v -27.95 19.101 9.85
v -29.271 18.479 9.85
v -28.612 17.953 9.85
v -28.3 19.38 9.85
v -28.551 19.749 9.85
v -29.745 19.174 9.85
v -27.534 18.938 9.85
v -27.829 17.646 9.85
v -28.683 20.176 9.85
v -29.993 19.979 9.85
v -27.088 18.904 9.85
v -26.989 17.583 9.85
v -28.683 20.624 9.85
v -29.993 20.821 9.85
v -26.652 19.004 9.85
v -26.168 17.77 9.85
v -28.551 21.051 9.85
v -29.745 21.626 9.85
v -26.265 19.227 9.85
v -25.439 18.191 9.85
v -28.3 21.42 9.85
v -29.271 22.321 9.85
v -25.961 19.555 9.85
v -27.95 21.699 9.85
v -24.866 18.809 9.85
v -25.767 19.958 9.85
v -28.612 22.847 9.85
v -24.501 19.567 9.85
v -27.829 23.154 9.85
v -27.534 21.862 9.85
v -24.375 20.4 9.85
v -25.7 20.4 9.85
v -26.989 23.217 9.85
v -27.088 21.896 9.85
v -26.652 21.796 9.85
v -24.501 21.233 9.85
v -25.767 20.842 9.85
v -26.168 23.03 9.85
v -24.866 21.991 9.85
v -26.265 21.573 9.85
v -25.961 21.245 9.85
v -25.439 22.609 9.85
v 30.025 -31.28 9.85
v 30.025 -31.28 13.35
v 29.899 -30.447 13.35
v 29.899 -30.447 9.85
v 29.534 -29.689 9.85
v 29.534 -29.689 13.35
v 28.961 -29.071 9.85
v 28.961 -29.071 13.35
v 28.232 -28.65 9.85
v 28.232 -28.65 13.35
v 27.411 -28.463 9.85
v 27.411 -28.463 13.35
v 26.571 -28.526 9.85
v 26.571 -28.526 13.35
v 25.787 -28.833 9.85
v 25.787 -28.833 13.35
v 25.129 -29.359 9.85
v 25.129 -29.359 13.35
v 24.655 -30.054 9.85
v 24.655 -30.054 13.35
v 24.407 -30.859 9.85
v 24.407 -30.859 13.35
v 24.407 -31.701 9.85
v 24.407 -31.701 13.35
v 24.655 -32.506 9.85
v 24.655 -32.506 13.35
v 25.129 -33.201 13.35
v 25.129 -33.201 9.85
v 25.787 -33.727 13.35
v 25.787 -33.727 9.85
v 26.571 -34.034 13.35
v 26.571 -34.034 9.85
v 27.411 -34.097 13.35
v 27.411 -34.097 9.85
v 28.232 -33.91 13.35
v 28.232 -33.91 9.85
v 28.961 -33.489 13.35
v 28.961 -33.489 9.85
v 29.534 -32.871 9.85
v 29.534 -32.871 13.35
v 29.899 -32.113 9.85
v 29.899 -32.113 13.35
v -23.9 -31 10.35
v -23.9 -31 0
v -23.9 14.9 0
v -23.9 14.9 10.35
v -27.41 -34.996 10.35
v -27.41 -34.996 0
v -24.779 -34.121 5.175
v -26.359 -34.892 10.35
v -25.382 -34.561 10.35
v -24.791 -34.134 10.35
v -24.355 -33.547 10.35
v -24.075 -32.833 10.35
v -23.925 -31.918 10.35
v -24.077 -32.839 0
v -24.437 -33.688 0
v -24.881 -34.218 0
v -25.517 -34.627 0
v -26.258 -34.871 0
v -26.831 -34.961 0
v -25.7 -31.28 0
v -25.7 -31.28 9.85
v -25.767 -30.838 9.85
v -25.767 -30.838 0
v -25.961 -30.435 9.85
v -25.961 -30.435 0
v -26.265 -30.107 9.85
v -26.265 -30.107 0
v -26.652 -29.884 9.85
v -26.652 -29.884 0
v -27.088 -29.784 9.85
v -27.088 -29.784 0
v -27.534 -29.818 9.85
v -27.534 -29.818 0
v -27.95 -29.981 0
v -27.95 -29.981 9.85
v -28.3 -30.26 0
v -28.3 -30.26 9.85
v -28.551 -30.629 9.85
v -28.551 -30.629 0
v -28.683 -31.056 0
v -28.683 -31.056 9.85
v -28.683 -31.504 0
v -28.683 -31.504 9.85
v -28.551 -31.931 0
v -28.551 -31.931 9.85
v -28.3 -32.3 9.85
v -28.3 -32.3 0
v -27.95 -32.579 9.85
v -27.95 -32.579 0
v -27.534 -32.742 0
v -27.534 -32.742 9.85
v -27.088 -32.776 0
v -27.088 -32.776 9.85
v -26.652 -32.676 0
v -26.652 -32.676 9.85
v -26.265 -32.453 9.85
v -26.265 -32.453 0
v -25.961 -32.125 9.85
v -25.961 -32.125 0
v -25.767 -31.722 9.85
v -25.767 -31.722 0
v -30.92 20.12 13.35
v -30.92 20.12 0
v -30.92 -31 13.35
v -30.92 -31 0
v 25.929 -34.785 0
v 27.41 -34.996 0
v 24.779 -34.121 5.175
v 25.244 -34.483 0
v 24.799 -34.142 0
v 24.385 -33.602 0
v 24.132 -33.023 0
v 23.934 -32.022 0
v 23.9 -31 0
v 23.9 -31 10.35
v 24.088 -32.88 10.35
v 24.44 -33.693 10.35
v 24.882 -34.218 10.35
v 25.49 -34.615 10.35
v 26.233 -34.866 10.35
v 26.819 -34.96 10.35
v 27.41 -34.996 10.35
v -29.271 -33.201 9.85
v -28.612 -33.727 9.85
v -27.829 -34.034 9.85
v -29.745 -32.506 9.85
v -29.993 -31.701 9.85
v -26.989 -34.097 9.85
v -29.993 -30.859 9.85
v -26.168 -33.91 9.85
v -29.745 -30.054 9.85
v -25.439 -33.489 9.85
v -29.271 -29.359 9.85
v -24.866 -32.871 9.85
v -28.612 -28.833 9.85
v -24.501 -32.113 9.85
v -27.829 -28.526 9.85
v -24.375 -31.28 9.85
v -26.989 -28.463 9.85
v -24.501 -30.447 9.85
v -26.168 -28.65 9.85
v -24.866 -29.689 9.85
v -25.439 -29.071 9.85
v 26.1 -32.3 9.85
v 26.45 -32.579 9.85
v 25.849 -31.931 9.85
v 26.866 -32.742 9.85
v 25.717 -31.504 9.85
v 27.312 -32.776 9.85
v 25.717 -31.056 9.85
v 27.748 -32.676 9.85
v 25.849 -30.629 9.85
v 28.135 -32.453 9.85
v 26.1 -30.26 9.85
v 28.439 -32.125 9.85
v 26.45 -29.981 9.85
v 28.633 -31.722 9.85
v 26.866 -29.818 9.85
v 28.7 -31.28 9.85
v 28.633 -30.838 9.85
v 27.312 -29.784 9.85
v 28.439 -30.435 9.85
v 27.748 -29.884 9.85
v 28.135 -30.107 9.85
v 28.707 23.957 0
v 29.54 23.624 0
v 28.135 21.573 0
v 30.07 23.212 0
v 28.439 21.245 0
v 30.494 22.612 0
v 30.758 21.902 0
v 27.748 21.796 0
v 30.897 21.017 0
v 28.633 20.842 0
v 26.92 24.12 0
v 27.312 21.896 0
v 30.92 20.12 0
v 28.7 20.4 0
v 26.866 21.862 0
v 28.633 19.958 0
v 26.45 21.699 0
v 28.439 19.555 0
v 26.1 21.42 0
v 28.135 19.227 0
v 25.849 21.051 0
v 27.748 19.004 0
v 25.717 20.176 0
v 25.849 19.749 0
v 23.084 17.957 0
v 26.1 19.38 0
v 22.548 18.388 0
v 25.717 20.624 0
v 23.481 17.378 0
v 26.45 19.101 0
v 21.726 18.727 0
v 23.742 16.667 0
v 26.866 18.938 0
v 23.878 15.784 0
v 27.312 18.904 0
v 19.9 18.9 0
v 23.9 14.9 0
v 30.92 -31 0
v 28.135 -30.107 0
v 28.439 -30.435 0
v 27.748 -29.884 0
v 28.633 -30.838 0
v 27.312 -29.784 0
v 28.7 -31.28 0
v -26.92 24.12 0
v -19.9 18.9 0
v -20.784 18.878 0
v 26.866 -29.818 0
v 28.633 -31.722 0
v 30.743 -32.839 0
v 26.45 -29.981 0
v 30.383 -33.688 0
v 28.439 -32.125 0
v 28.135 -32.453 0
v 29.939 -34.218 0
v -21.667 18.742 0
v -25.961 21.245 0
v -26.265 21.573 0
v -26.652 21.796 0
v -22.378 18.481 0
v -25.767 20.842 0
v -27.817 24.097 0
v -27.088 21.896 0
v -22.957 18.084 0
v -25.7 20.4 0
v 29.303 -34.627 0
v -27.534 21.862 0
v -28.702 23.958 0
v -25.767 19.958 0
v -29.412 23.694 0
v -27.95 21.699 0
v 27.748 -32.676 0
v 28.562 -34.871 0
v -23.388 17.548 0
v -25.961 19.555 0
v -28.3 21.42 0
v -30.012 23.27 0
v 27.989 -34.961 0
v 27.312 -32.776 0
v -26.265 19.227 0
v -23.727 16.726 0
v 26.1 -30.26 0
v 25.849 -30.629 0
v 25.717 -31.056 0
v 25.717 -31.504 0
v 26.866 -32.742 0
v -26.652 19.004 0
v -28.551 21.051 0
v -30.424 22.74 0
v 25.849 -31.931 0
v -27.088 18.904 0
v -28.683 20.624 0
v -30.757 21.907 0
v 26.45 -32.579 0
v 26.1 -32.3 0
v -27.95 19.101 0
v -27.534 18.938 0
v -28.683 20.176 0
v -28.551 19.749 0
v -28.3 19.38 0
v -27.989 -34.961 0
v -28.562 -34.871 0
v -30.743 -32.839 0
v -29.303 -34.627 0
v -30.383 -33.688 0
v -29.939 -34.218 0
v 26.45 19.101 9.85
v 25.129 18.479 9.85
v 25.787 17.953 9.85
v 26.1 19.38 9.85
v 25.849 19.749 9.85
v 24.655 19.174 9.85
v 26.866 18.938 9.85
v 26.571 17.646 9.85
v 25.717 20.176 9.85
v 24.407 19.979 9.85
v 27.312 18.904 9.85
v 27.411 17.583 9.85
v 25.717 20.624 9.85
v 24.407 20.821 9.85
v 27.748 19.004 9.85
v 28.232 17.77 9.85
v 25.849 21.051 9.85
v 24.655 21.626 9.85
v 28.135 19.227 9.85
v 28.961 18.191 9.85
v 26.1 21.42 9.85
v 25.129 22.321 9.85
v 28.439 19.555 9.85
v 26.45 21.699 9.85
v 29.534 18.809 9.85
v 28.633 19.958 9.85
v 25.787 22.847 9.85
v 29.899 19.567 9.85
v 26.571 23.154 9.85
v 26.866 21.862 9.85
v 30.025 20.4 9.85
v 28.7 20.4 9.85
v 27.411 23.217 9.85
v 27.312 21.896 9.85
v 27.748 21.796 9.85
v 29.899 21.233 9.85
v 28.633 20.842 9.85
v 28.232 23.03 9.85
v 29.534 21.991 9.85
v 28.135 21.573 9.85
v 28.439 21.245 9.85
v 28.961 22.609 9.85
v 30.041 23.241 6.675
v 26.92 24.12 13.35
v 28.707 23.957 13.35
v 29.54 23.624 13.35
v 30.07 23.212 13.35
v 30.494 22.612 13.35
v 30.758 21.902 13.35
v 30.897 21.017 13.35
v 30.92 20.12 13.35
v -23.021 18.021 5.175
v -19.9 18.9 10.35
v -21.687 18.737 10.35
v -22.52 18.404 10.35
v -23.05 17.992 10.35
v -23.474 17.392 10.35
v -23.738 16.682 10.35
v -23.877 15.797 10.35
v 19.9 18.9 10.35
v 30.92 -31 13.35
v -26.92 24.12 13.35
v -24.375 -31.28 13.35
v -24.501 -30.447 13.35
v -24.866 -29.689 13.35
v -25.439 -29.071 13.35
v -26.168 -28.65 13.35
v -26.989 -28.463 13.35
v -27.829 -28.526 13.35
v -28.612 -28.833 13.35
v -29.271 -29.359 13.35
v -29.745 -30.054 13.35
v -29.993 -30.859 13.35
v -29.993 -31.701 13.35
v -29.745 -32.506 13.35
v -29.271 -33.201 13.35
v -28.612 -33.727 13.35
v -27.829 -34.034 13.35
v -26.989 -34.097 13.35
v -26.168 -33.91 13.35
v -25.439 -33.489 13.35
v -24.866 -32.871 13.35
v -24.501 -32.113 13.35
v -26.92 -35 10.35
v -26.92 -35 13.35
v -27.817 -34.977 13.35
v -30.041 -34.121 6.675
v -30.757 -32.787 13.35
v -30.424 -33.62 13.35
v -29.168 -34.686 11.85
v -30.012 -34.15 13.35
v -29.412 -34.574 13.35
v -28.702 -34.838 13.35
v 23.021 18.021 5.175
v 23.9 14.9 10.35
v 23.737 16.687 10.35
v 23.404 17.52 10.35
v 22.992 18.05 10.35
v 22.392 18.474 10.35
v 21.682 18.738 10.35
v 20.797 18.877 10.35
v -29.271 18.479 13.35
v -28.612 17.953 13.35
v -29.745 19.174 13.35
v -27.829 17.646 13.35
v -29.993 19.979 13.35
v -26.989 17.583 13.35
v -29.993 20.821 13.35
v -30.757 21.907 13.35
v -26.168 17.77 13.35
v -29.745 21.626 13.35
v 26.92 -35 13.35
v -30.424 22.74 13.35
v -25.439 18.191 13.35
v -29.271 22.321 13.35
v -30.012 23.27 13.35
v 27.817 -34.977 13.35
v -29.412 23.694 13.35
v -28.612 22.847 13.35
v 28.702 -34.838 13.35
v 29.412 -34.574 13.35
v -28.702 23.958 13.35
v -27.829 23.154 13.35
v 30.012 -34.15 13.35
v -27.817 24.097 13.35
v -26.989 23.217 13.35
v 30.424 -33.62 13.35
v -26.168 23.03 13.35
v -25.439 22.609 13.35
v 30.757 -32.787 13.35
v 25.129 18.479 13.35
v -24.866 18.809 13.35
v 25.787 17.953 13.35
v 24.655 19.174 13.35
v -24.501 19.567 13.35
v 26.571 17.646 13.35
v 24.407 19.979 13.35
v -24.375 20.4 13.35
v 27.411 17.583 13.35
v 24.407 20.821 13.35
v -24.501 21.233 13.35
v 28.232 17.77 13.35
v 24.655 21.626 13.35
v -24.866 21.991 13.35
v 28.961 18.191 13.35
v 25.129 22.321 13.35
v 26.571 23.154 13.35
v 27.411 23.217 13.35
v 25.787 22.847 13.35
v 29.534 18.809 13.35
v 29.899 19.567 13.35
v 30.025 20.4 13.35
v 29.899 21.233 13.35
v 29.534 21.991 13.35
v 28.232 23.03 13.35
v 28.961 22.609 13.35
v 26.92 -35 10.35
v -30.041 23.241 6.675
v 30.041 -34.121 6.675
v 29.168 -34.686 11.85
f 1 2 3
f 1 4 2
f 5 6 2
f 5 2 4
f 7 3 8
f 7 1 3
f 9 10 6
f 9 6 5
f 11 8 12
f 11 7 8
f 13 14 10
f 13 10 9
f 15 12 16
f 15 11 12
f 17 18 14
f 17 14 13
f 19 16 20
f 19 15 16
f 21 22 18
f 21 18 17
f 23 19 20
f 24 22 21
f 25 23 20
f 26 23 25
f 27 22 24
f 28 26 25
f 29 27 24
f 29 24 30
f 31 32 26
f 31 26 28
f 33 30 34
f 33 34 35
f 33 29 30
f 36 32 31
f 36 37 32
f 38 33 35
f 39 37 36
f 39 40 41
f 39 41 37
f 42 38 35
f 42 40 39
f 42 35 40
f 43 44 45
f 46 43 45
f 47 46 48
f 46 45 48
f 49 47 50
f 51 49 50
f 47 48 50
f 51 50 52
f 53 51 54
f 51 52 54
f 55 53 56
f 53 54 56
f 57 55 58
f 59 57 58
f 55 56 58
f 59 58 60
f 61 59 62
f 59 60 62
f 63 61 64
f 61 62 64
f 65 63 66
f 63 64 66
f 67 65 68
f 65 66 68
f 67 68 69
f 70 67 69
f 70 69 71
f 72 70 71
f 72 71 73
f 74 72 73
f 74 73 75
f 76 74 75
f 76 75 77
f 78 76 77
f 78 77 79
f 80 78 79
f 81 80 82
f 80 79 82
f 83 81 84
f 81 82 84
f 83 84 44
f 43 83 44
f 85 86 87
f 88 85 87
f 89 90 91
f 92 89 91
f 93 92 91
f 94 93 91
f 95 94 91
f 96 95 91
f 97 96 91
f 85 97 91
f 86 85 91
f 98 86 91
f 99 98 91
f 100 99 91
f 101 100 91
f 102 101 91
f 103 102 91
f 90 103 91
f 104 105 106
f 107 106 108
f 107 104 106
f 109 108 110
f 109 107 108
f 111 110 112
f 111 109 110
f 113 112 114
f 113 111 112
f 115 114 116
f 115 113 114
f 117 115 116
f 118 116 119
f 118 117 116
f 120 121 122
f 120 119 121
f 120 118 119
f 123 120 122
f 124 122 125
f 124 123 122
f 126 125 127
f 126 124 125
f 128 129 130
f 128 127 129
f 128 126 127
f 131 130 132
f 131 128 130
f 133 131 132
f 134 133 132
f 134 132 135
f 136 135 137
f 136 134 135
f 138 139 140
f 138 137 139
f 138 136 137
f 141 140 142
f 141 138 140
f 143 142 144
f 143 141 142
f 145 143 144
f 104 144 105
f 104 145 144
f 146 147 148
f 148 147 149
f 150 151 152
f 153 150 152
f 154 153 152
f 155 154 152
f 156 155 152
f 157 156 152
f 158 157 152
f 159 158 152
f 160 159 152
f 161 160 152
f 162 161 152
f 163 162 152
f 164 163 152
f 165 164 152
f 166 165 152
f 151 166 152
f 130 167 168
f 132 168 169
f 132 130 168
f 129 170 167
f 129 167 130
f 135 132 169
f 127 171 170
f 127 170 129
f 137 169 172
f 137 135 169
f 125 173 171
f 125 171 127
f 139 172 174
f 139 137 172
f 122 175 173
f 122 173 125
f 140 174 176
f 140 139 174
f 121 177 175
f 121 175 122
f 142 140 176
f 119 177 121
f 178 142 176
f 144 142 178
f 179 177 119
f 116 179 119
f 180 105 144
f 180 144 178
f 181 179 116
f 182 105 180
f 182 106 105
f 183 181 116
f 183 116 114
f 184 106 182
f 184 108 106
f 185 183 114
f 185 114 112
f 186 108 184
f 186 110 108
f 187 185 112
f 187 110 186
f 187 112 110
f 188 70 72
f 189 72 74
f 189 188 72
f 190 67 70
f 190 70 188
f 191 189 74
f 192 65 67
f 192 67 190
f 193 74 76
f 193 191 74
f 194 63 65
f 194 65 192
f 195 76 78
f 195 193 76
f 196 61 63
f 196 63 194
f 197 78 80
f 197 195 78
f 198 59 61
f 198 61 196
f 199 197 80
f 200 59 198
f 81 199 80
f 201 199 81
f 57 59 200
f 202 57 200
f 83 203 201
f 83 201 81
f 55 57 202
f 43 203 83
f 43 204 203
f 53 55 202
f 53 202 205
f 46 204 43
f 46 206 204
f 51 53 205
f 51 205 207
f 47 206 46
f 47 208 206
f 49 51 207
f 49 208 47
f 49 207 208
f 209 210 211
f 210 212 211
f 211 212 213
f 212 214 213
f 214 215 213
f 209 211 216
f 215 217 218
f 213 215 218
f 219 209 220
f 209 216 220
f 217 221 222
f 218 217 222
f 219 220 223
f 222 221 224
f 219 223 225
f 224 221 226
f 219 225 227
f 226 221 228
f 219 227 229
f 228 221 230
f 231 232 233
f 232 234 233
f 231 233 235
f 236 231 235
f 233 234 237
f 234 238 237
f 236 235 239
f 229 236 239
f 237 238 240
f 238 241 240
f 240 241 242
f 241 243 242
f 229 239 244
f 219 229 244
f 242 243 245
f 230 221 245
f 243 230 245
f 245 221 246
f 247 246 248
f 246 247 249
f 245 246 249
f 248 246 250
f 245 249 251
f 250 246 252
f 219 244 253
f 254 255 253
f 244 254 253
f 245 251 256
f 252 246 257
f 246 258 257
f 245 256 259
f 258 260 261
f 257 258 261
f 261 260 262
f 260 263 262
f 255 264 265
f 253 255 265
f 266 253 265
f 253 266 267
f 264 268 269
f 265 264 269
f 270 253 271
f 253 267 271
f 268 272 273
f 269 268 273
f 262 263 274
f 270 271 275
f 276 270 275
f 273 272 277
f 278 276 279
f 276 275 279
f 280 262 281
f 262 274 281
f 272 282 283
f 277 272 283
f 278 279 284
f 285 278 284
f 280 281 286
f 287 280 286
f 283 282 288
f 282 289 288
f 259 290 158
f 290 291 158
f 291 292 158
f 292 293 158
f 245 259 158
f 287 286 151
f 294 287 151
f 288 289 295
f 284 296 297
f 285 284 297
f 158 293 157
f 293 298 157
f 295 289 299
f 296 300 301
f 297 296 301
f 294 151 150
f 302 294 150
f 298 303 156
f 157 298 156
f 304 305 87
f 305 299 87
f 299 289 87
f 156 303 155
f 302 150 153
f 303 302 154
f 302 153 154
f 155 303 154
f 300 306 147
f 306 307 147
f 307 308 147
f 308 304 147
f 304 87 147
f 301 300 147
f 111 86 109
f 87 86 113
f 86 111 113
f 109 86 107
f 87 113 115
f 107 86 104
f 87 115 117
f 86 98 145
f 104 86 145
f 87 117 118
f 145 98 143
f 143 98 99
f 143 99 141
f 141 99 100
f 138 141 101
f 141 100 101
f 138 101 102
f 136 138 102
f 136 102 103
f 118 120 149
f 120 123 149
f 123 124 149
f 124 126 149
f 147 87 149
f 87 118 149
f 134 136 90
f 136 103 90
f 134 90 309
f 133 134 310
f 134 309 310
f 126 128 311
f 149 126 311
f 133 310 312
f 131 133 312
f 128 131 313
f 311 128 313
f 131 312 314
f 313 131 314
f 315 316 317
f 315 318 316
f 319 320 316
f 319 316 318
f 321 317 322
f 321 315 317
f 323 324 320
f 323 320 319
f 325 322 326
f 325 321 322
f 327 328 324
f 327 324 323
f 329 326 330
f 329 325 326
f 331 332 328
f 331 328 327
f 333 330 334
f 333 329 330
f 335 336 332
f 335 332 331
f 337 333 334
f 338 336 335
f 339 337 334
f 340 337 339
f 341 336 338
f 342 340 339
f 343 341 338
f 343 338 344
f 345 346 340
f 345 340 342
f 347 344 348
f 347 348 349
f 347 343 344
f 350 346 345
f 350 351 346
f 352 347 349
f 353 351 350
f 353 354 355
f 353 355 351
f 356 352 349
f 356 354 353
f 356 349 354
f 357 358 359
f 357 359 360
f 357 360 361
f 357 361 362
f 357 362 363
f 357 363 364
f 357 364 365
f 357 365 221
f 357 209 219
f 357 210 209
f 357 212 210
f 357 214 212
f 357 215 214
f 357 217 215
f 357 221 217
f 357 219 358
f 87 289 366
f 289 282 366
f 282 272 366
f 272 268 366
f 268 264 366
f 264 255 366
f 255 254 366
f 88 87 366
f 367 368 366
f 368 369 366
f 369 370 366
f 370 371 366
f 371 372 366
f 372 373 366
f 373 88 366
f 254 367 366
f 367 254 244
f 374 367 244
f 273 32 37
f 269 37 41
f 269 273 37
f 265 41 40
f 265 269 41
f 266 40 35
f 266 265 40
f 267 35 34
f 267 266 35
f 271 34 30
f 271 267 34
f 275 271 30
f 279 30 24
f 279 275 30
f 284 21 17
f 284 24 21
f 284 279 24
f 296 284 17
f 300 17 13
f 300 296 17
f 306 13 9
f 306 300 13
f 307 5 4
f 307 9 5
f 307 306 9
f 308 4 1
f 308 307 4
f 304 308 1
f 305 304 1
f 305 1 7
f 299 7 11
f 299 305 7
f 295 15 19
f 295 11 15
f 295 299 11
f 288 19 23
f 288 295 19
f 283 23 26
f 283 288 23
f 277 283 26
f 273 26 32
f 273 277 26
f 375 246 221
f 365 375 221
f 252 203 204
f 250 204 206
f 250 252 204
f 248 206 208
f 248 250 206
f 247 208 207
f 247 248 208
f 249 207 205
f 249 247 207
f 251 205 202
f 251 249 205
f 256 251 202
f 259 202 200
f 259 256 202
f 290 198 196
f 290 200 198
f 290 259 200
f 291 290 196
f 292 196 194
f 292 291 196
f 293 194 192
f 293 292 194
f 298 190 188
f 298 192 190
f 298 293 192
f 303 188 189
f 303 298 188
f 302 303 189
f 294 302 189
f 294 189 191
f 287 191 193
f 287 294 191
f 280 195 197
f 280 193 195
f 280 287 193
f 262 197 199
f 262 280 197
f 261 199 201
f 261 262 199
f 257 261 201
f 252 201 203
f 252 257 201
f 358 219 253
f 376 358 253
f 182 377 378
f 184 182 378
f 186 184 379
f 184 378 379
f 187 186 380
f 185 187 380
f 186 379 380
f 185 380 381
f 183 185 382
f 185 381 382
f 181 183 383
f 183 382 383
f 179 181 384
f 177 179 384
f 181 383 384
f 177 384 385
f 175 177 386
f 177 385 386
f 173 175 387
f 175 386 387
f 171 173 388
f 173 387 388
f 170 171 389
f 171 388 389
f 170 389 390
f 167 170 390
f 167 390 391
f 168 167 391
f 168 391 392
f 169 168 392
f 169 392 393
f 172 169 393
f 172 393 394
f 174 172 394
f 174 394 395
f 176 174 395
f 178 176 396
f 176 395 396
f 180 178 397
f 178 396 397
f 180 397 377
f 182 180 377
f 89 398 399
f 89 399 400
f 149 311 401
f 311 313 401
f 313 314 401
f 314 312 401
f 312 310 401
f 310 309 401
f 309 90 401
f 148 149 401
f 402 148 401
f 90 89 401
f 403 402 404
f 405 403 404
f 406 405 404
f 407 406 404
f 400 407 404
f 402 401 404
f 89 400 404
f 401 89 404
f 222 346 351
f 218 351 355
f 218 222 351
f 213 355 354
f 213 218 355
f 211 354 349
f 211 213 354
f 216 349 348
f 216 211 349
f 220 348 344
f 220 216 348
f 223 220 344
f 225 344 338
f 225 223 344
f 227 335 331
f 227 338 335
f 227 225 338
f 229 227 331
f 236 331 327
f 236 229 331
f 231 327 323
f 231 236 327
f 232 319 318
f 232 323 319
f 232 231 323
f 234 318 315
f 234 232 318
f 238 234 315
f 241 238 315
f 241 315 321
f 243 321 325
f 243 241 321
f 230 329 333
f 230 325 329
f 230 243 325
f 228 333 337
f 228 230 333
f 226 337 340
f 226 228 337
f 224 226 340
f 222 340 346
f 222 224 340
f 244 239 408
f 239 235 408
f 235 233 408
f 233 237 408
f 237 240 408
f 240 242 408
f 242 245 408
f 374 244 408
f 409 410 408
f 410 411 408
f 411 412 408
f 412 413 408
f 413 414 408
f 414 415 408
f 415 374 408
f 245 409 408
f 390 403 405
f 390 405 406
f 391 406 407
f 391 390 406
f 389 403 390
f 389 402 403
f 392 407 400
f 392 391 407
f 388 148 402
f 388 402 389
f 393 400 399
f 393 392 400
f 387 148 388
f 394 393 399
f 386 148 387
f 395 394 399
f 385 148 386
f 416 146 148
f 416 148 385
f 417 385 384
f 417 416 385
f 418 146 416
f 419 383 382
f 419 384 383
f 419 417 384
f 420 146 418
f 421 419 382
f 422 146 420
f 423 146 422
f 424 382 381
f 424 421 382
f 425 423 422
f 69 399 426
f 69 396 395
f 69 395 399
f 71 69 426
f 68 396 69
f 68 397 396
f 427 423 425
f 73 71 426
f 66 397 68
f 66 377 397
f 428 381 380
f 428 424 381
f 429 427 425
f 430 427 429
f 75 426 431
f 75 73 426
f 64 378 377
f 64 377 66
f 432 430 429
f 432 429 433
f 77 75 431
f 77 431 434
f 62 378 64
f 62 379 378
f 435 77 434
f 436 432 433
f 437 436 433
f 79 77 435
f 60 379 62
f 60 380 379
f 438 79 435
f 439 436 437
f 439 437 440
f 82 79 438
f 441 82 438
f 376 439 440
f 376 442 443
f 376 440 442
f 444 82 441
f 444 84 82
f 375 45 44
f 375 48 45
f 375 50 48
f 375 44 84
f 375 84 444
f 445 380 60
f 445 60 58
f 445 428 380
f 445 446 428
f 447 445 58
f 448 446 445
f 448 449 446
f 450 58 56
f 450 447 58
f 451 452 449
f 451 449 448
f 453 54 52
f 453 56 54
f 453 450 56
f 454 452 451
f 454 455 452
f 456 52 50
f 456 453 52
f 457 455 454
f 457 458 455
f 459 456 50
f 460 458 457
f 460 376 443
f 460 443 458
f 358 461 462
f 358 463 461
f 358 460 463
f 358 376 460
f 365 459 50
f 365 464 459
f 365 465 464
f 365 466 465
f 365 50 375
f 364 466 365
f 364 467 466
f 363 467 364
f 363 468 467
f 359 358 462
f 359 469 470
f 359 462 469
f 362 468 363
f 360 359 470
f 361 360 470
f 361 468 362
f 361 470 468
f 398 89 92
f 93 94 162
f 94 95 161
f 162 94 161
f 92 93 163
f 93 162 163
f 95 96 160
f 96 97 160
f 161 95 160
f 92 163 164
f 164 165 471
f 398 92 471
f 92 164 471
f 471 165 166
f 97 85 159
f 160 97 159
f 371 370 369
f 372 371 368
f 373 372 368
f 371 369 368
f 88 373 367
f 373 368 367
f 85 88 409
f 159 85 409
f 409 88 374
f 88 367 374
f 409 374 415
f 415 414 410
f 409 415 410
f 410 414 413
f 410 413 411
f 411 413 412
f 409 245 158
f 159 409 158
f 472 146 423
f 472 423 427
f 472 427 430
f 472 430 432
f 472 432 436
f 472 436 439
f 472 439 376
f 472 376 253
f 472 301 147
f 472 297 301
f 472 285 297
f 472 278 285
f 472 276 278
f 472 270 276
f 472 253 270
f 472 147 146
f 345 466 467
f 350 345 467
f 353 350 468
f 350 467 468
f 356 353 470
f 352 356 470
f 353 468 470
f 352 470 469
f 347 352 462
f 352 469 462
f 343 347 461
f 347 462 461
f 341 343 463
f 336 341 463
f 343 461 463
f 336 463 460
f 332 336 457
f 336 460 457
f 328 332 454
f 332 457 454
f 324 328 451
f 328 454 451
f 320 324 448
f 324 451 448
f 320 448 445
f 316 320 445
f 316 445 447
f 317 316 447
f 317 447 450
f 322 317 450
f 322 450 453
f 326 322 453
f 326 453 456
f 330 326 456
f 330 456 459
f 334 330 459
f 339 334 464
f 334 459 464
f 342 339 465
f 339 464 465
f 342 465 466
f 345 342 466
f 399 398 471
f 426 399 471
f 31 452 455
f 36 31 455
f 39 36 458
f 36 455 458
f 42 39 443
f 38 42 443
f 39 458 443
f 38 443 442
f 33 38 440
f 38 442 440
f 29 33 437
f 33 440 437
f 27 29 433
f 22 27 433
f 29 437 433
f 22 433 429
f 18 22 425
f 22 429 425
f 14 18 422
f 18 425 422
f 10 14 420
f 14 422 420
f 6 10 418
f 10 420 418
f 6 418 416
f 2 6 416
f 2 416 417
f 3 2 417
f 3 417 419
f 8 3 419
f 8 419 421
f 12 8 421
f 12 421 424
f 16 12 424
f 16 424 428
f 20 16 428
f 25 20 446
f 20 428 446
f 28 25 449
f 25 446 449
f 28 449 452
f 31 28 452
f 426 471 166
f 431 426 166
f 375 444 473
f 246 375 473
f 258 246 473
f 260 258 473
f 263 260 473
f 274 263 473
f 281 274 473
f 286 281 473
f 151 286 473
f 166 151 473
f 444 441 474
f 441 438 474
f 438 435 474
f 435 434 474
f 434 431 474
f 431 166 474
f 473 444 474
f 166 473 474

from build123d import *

# Parameters (mm, degrees)
SKETCH2_R           = 1.5
BOSS_EXTRUDE1_DEPTH = 10.35
BOSS_EXTRUDE2_START = 10.35
SKETCH2_3_R         = 1.5
BOSS_EXTRUDE2_DEPTH = 3
FILLET1_SIZE        = 4
FILLET2_SIZE        = 4
SKETCH7_R           = 2.825
CUT_EXTRUDE1_DEPTH  = 3.5


with BuildPart() as part:
    # Sketch2 → Boss-Extrude1 (new body)
    with BuildSketch(Plane.XY):
        Polygon((-30.92, -35), (-23.9, -35), (-23.9, 18.9), (23.9, 18.9), (23.9, -35), (30.92, -35), (30.92, 24.12), (-30.92, 24.12), align=None)
        with Locations((-27.2, -31.28)):
            Circle(SKETCH2_R, mode=Mode.SUBTRACT)
        with Locations((27.2, -31.28)):
            Circle(SKETCH2_R, mode=Mode.SUBTRACT)
        with Locations((-27.2, 20.4)):
            Circle(SKETCH2_R, mode=Mode.SUBTRACT)
        with Locations((27.2, 20.4)):
            Circle(SKETCH2_R, mode=Mode.SUBTRACT)
    extrude(amount=BOSS_EXTRUDE1_DEPTH)

    # Sketch2<3> → Boss-Extrude2 (add)
    # profile 1 of 2: a face of its own
    with BuildSketch(Plane.XY.offset(BOSS_EXTRUDE2_START)):
        Polygon((-30.92, -35), (-23.9, -35), (-23.9, 18.9), (23.9, 18.9), (23.9, -35), (30.92, -35), (30.92, 24.12), (-30.92, 24.12), align=None)
        with Locations((-27.2, -31.28)):
            Circle(SKETCH2_3_R, mode=Mode.SUBTRACT)
        with Locations((27.2, -31.28)):
            Circle(SKETCH2_3_R, mode=Mode.SUBTRACT)
        with Locations((-27.2, 20.4)):
            Circle(SKETCH2_3_R, mode=Mode.SUBTRACT)
        with Locations((27.2, 20.4)):
            Circle(SKETCH2_3_R, mode=Mode.SUBTRACT)
    # profile 2 of 2: a face of its own
    with BuildSketch(Plane.XY.offset(BOSS_EXTRUDE2_START)):
        Polygon((-23.9, -35), (-16, -35), (16, -35), (23.9, -35), (23.9, 18.9), (-23.9, 18.9), align=None)
    extrude(amount=BOSS_EXTRUDE2_DEPTH)

    # Fillet1
    # a fillet whose section is not a circle: 4 mm, written as the material it adds along each edge
    with BuildSketch(Plane(origin=(-23.9, 18.9, 0), x_dir=(0, -1, 0), z_dir=(0, 0, 1))) as fillet1_piece_1_section:
        with BuildLine():
            add(Edge.make_bspline([(FILLET1_SIZE, 0), (FILLET1_SIZE * 0.831801948466, 0), (FILLET1_SIZE * 0.663603896932, 0), (FILLET1_SIZE * 0.292893218813, FILLET1_SIZE * 0.0716919198361), (FILLET1_SIZE * 0.0716919198361, FILLET1_SIZE * 0.292893218813), (0, FILLET1_SIZE * 0.663603896932), (0, FILLET1_SIZE * 0.831801948466), (0, FILLET1_SIZE)], knots=[0, 0, 0, 0, 0, 0, 0.5, 0.5, 1, 1, 1, 1, 1, 1], degree=5))
            Line((0, FILLET1_SIZE), (0, 0))
            Line((0, 0), (FILLET1_SIZE, 0))
        make_face()
    fillet1_piece_1 = extrude(amount=20.35, mode=Mode.PRIVATE)
    fillet1_piece_1 = split(fillet1_piece_1, bisect_by=Plane(origin=(-23.9, 18.9, 13.35), z_dir=(0, 0, -1)), keep=Keep.TOP, mode=Mode.PRIVATE)
    add(fillet1_piece_1)
    with BuildSketch(Plane(origin=(23.9, 18.9, 0), x_dir=(-1, 0, 0), z_dir=(0, 0, 1))) as fillet1_piece_2_section:
        with BuildLine():
            add(Edge.make_bspline([(FILLET1_SIZE, 0), (FILLET1_SIZE * 0.831801948466, 0), (FILLET1_SIZE * 0.663603896932, 0), (FILLET1_SIZE * 0.292893218813, FILLET1_SIZE * 0.0716919198361), (FILLET1_SIZE * 0.0716919198361, FILLET1_SIZE * 0.292893218813), (0, FILLET1_SIZE * 0.663603896932), (0, FILLET1_SIZE * 0.831801948466), (0, FILLET1_SIZE)], knots=[0, 0, 0, 0, 0, 0, 0.5, 0.5, 1, 1, 1, 1, 1, 1], degree=5))
            Line((0, FILLET1_SIZE), (0, 0))
            Line((0, 0), (FILLET1_SIZE, 0))
        make_face()
    fillet1_piece_2 = extrude(amount=20.35, mode=Mode.PRIVATE)
    fillet1_piece_2 = split(fillet1_piece_2, bisect_by=Plane(origin=(23.9, 18.9, 13.35), z_dir=(0, 0, -1)), keep=Keep.TOP, mode=Mode.PRIVATE)
    add(fillet1_piece_2)

    # Fillet2
    # a fillet whose section is not a circle: 4 mm, written as the material it takes off along each edge
    with BuildSketch(Plane(origin=(23.9, -35, -10), x_dir=(0, 1, 0), z_dir=(0, 0, 1)), Plane(origin=(-23.9, -35, -10), x_dir=(-1, 0, 0), z_dir=(0, 0, 1))) as fillet2_piece_1:
        with BuildLine():
            add(Edge.make_bspline([(FILLET2_SIZE, 0), (FILLET2_SIZE * 0.831801948466, 0), (FILLET2_SIZE * 0.663603896932, 0), (FILLET2_SIZE * 0.292893218813, -FILLET2_SIZE * 0.0716919198361), (FILLET2_SIZE * 0.0716919198361, -FILLET2_SIZE * 0.292893218813), (0, -FILLET2_SIZE * 0.663603896932), (0, -FILLET2_SIZE * 0.831801948466), (0, -FILLET2_SIZE)], knots=[0, 0, 0, 0, 0, 0, 0.5, 0.5, 1, 1, 1, 1, 1, 1], degree=5))
            Line((0, -FILLET2_SIZE), (0, 0))
            Line((0, 0), (FILLET2_SIZE, 0))
        make_face()
    extrude(amount=20.35, mode=Mode.SUBTRACT)
    with BuildSketch(Plane(origin=(-30.92, -35, 23.35), x_dir=(1, 0, 0), z_dir=(0, 0, -1)), Plane(origin=(30.92, -35, -10), x_dir=(-1, 0, 0), z_dir=(0, 0, 1))) as fillet2_piece_2:
        with BuildLine():
            add(Edge.make_bspline([(FILLET2_SIZE, 0), (FILLET2_SIZE * 0.831801948466, 0), (FILLET2_SIZE * 0.663603896932, 0), (FILLET2_SIZE * 0.292893218813, -FILLET2_SIZE * 0.0716919198361), (FILLET2_SIZE * 0.0716919198361, -FILLET2_SIZE * 0.292893218813), (0, -FILLET2_SIZE * 0.663603896932), (0, -FILLET2_SIZE * 0.831801948466), (0, -FILLET2_SIZE)], knots=[0, 0, 0, 0, 0, 0, 0.5, 0.5, 1, 1, 1, 1, 1, 1], degree=5))
            Line((0, -FILLET2_SIZE), (0, 0))
            Line((0, 0), (FILLET2_SIZE, 0))
        make_face()
    extrude(amount=33.35, mode=Mode.SUBTRACT)
    with BuildSketch(Plane(origin=(30.92, 24.12, 23.35), x_dir=(0, -1, 0), z_dir=(0, 0, -1)), Plane(origin=(-30.92, 24.12, 23.35), x_dir=(1, 0, 0), z_dir=(0, 0, -1))) as fillet2_piece_3:
        with BuildLine():
            add(Edge.make_bspline([(FILLET2_SIZE, 0), (FILLET2_SIZE * 0.831801948466, 0), (FILLET2_SIZE * 0.663603896932, 0), (FILLET2_SIZE * 0.292893218813, FILLET2_SIZE * 0.0716919198361), (FILLET2_SIZE * 0.0716919198361, FILLET2_SIZE * 0.292893218813), (0, FILLET2_SIZE * 0.663603896932), (0, FILLET2_SIZE * 0.831801948466), (0, FILLET2_SIZE)], knots=[0, 0, 0, 0, 0, 0, 0.5, 0.5, 1, 1, 1, 1, 1, 1], degree=5))
            Line((0, FILLET2_SIZE), (0, 0))
            Line((0, 0), (FILLET2_SIZE, 0))
        make_face()
    extrude(amount=33.35, mode=Mode.SUBTRACT)

    # Sketch7 → Cut-Extrude1 (cut)
    with BuildSketch(Plane.XY.offset(13.35)):
        with Locations((-27.2, 20.4)):
            Circle(SKETCH7_R)
        with Locations((27.2, 20.4)):
            Circle(SKETCH7_R)
        with Locations((27.2, -31.28)):
            Circle(SKETCH7_R)
        with Locations((-27.2, -31.28)):
            Circle(SKETCH7_R)
    extrude(amount=-CUT_EXTRUDE1_DEPTH, mode=Mode.SUBTRACT)


solid = part.part
